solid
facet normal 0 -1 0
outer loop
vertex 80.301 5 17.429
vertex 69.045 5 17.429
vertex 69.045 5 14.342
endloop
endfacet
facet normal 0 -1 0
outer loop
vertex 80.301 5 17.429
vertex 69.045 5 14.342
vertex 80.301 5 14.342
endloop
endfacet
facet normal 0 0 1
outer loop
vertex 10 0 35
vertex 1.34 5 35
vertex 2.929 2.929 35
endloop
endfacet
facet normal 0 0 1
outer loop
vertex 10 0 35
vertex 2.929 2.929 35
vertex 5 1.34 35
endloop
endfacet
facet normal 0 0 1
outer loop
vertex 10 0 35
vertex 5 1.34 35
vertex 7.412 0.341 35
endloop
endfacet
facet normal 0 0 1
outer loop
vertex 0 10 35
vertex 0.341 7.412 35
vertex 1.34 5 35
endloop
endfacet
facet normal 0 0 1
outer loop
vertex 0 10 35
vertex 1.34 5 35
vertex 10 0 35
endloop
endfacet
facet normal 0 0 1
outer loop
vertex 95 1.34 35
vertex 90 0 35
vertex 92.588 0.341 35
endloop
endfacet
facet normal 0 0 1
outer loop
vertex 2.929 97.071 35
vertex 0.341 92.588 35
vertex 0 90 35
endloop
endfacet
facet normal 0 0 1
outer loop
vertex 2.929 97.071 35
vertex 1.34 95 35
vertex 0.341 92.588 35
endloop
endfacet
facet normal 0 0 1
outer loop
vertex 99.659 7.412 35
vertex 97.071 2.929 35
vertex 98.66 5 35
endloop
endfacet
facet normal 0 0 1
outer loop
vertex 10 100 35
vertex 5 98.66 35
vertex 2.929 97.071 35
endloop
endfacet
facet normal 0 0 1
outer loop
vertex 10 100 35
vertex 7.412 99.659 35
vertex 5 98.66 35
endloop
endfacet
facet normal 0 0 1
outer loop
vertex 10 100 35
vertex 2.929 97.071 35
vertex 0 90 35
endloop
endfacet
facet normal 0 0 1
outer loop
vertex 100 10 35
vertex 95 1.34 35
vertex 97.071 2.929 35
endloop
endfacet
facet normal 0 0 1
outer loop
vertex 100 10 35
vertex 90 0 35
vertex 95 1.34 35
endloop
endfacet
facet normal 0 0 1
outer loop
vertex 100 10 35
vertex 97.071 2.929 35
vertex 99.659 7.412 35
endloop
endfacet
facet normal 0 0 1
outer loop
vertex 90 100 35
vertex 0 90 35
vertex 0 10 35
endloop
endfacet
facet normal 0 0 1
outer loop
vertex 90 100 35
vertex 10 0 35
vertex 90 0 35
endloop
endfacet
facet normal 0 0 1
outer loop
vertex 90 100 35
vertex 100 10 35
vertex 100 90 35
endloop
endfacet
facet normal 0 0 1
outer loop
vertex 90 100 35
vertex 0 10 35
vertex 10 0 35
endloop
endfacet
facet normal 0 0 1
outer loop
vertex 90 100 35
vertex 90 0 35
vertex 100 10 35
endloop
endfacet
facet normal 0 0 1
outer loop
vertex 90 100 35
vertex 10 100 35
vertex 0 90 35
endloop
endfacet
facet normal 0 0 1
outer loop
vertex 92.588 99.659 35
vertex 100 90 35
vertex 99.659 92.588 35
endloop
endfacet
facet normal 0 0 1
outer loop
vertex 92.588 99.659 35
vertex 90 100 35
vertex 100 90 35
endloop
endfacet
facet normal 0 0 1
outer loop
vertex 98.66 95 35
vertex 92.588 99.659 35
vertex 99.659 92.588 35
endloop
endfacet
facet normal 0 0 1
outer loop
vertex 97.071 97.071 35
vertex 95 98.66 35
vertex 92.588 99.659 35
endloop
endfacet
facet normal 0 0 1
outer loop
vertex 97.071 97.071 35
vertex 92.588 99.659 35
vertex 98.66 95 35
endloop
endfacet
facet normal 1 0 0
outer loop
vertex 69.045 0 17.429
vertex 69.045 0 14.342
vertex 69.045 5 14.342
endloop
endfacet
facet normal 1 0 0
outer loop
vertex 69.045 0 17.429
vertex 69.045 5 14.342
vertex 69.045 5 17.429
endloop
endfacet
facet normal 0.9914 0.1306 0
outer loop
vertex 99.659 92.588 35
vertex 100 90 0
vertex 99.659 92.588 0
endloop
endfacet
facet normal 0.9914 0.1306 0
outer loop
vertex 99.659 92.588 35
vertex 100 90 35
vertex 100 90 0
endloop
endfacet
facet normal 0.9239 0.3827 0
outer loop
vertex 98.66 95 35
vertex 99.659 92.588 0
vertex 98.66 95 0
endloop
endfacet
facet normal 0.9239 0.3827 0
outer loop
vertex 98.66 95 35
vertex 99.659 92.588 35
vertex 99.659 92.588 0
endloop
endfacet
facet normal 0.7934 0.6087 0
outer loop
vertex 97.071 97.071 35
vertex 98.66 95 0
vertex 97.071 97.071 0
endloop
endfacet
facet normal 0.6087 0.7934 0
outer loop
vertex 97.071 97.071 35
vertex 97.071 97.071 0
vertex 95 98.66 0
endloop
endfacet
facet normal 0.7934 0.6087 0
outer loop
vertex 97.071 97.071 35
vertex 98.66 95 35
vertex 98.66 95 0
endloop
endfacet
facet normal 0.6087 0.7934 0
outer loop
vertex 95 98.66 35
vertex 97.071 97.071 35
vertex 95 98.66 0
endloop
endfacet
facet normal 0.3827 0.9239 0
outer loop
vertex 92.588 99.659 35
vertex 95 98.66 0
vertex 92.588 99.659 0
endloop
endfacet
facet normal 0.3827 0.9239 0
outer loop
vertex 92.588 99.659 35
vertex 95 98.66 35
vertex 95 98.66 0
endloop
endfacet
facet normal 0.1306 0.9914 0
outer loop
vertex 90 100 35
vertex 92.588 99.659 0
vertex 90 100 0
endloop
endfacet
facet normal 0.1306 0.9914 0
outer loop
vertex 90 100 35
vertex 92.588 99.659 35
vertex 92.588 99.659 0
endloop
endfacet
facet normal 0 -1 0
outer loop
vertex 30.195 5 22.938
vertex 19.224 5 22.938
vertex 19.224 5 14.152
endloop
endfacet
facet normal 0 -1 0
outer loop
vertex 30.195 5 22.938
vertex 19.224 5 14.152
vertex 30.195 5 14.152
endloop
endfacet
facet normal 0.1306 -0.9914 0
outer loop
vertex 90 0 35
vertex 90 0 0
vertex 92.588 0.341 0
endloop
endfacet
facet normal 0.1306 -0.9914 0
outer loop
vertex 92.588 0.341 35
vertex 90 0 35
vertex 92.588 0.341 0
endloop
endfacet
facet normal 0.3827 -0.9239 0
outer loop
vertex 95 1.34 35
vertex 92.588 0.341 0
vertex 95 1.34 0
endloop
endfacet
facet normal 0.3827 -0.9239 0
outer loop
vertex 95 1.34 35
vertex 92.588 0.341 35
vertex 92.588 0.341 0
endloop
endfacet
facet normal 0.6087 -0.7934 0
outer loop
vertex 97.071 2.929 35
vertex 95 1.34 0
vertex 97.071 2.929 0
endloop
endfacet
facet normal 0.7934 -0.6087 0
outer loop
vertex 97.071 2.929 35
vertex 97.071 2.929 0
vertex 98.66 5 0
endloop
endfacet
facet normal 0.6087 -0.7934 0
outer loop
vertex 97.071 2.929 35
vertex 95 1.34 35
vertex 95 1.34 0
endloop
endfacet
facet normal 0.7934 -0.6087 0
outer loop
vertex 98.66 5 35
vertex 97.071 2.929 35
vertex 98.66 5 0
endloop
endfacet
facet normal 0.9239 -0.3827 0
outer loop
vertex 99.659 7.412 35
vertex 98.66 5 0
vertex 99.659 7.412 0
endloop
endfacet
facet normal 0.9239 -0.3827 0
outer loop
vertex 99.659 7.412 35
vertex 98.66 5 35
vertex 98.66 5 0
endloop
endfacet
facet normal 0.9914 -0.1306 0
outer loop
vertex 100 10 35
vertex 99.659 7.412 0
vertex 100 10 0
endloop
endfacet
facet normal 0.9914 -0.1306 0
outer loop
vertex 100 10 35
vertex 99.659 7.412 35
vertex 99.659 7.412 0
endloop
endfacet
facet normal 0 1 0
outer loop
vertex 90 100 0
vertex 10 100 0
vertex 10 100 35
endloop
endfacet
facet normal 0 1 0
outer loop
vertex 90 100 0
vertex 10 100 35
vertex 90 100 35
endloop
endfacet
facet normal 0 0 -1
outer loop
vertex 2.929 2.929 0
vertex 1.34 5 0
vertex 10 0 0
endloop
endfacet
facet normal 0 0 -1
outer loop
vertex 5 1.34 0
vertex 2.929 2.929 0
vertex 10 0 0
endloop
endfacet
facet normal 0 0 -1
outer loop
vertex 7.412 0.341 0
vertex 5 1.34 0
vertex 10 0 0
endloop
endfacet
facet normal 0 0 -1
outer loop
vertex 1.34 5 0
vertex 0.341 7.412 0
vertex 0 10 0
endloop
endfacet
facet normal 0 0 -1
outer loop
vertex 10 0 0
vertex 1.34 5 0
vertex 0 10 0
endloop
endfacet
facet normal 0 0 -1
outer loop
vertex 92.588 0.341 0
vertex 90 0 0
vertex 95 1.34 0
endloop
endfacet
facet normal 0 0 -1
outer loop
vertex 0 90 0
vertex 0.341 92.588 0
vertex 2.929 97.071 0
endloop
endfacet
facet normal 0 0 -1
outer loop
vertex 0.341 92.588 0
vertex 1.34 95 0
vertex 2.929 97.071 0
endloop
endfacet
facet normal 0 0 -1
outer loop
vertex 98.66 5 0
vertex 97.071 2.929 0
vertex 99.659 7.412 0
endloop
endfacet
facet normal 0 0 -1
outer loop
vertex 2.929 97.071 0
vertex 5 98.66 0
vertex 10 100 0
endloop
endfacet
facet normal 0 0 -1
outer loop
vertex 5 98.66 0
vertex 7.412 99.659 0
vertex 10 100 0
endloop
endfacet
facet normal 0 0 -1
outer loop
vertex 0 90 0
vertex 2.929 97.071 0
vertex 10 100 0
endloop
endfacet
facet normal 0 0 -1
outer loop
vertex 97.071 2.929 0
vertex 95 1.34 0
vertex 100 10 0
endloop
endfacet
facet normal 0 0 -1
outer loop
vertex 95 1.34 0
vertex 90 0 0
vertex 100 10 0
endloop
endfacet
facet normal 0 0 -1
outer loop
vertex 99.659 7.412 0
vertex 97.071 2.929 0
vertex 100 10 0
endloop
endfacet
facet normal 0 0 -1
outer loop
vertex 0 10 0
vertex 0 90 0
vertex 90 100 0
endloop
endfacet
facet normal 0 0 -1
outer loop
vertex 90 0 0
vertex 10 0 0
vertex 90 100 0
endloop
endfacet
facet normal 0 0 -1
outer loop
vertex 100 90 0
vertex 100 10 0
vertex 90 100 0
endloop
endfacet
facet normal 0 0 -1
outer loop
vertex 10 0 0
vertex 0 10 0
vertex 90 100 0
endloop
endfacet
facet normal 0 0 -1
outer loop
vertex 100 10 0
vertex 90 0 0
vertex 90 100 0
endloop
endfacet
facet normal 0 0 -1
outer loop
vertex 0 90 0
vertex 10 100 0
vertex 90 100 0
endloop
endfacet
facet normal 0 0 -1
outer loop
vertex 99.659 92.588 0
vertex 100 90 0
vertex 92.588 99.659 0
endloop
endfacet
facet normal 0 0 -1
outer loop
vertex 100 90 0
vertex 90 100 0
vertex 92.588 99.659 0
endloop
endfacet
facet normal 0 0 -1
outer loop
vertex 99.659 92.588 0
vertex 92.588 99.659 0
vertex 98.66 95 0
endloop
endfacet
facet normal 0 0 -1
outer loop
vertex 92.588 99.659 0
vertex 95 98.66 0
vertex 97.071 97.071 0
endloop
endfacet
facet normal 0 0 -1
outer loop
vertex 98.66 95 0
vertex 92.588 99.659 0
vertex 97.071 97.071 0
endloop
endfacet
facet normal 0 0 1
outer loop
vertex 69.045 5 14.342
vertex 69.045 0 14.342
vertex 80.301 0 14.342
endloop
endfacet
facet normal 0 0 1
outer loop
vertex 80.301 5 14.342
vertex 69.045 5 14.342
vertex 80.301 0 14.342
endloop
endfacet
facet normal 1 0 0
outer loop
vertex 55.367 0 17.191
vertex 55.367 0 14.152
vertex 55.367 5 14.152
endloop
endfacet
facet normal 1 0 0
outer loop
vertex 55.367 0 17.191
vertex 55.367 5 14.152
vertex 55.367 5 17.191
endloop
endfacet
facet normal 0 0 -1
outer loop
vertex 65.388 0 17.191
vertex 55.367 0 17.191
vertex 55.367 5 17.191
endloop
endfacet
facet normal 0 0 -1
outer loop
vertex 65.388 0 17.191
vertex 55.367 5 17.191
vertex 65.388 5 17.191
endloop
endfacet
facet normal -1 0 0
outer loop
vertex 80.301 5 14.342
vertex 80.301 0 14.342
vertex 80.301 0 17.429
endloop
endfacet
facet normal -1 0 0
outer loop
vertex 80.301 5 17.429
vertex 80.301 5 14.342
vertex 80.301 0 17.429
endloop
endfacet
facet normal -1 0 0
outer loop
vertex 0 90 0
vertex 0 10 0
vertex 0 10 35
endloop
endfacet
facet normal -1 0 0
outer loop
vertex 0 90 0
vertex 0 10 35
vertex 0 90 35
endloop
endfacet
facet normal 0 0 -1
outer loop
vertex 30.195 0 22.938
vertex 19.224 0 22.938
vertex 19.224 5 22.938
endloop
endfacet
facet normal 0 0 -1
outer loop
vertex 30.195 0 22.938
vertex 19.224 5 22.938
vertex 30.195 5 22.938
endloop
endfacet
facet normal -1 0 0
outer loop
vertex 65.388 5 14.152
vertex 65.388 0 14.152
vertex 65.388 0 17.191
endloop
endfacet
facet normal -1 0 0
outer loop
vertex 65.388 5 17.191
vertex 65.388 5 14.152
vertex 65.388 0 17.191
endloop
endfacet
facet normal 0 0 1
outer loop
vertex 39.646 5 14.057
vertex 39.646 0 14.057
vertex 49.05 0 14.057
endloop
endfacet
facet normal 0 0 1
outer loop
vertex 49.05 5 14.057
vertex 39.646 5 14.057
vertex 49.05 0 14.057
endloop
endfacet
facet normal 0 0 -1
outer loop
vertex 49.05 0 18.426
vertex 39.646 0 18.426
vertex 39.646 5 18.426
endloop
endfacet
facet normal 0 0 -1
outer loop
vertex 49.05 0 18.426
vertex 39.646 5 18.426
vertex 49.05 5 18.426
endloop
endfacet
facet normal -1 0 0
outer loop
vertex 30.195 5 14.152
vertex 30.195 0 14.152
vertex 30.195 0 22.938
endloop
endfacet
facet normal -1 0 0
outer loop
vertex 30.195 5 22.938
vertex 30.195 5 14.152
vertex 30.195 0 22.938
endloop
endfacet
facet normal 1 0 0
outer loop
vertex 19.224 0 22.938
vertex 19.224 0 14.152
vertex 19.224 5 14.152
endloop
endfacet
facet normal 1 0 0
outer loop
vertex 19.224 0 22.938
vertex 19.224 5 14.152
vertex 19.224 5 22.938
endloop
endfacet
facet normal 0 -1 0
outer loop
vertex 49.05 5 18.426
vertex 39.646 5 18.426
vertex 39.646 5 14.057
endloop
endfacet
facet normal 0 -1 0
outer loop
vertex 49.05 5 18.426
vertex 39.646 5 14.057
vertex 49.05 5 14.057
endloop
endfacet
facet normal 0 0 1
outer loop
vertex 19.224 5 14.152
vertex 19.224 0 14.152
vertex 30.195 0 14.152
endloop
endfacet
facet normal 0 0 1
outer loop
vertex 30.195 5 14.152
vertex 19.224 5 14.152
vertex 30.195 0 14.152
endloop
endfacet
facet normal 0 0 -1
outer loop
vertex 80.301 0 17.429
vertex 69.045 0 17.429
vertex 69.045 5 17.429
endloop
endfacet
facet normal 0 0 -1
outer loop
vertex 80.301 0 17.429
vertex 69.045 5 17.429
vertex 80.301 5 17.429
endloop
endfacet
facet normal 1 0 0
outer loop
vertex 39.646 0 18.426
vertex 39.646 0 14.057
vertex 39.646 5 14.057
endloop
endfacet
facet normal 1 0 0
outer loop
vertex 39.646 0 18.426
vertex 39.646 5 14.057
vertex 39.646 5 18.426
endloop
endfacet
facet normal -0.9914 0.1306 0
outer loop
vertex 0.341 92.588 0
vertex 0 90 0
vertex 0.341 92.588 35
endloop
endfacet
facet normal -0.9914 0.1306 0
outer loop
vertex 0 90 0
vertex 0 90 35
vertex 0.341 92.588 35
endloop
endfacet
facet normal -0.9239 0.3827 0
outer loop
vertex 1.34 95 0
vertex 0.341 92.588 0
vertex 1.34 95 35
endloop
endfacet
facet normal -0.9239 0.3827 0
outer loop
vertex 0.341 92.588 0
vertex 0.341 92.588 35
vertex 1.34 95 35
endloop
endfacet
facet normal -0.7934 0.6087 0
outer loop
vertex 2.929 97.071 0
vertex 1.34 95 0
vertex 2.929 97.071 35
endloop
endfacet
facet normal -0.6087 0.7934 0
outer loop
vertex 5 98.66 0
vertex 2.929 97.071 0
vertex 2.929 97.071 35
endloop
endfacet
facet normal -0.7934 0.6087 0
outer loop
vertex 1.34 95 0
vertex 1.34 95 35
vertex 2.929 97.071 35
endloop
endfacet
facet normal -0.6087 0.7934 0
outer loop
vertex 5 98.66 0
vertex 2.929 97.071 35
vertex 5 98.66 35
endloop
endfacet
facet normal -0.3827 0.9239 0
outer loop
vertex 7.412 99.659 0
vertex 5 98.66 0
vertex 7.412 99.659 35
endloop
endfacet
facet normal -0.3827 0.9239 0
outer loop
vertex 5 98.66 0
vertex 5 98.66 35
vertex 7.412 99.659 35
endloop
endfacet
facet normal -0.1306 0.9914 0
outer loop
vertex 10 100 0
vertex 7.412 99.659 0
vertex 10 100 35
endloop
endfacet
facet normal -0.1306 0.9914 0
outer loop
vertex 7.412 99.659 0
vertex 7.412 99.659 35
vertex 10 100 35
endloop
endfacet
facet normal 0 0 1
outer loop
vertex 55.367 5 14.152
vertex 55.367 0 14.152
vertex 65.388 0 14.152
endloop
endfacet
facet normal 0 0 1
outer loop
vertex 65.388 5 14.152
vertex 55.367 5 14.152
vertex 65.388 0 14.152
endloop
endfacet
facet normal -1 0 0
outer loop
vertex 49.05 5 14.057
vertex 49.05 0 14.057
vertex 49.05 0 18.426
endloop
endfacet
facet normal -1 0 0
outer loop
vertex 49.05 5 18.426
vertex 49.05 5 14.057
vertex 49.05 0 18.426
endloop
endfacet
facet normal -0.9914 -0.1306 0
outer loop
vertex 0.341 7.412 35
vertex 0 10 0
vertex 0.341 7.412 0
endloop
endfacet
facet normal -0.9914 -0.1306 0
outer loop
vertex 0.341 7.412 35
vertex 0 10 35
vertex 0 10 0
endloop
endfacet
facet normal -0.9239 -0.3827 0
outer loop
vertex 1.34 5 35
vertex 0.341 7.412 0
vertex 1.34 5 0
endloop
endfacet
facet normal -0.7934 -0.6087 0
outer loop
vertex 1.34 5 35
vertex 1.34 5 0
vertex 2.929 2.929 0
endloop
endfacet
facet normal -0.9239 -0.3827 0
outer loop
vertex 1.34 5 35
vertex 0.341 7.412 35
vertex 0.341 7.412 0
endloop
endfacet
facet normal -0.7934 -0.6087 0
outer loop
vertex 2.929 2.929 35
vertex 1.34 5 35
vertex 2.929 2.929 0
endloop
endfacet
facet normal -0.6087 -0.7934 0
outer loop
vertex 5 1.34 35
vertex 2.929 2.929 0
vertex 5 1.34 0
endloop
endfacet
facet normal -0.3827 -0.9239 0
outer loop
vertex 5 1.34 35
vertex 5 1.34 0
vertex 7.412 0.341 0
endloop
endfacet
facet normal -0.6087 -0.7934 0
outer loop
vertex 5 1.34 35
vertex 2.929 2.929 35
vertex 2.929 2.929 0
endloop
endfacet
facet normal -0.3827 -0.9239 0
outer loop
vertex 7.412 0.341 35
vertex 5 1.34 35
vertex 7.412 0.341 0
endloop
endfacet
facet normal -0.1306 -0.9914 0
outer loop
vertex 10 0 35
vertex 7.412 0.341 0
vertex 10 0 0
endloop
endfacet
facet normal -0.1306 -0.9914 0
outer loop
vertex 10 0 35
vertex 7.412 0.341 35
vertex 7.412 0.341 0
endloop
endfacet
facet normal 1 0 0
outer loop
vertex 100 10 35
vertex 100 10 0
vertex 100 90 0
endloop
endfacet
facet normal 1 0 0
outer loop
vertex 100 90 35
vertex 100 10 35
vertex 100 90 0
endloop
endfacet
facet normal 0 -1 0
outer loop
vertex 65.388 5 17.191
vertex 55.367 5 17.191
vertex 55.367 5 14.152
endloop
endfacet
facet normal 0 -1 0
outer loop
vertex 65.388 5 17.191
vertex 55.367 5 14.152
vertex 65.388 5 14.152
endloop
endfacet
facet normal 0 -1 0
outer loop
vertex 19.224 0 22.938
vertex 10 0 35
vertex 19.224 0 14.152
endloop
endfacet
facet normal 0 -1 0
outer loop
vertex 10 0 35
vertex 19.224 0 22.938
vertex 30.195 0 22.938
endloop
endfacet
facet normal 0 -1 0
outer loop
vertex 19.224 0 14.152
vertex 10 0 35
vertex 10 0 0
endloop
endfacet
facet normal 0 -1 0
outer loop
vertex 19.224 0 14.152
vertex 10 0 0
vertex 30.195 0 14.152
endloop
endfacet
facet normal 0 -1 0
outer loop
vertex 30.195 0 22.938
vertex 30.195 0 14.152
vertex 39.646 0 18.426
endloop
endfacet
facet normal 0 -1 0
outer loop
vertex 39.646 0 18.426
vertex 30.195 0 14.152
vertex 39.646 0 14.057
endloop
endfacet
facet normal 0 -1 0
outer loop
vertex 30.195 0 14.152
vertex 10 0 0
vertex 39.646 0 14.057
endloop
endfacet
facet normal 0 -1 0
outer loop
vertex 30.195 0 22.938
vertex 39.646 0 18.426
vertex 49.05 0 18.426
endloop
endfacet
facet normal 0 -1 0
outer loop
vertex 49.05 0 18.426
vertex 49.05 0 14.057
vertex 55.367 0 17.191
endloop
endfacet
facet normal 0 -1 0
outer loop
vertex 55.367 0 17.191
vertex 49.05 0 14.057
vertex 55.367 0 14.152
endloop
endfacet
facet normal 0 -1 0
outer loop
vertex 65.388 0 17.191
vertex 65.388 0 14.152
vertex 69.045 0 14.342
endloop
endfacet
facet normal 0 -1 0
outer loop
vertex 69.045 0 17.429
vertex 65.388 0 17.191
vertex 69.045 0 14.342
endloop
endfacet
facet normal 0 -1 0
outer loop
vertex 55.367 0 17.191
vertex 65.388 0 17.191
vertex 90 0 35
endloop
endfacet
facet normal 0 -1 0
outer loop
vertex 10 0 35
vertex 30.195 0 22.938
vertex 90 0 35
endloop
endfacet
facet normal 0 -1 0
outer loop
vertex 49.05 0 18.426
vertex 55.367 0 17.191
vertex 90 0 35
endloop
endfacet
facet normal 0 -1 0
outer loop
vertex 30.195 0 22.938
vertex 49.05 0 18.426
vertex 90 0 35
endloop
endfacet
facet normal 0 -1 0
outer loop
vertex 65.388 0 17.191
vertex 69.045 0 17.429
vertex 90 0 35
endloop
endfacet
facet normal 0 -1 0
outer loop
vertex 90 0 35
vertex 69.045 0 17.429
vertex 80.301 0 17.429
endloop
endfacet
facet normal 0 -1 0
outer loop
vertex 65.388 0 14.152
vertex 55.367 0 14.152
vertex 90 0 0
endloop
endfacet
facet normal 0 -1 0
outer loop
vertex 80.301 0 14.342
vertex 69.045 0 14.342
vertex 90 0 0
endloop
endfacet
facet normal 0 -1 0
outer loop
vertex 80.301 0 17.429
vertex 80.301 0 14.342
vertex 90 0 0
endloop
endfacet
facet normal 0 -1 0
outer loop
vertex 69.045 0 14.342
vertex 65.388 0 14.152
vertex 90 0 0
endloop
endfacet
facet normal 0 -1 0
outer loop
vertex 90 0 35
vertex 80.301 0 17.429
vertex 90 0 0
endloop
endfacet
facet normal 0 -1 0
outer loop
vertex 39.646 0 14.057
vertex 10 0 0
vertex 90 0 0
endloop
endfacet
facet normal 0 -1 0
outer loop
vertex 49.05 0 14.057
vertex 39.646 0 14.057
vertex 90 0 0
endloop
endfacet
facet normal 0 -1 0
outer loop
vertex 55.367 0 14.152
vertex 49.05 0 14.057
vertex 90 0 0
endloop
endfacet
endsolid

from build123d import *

# Parameters (mm, degrees)
SKETCH1_W           = 100
SKETCH1_H           = 100
BOSS_EXTRUDE1_DEPTH = 35
FILLET1_R           = 10
SKETCH2_W           = 9.403715906
SKETCH2_H           = 4.36940335
SKETCH2_W_2         = 10.971001891
SKETCH2_H_2         = 8.786300215
SKETCH2_W_3         = 11.255962979
SKETCH2_H_3         = 3.087078454
SKETCH2_W_4         = 10.021131597
SKETCH2_H_4         = 3.03958494
CUT_EXTRUDE1_DEPTH  = 5


with BuildPart() as part:
    # Sketch1 → Boss-Extrude1 (new body)
    with BuildSketch(Plane.XY):
        with Locations((50, 50)):
            Rectangle(SKETCH1_W, SKETCH1_H)
    extrude(amount=BOSS_EXTRUDE1_DEPTH)

    # Fillet1
    fillet1_edges = [part.edges().sort_by_distance(p)[0] for p in [
        (0, 100, 17.5),
        (100, 100, 17.5),
        (100, 0, 17.5),
        (0, 0, 17.5),
    ]]
    fillet(fillet1_edges, radius=FILLET1_R)

    # Sketch2 → Cut-Extrude1 (cut)
    with BuildSketch(Plane.XZ):
        with Locations((44.348271753, 16.241421861)):
            Rectangle(SKETCH2_W, SKETCH2_H)
        with Locations((24.709703434, 18.544857323)):
            Rectangle(SKETCH2_W_2, SKETCH2_H_2)
        with Locations((74.672880875, 15.885220501)):
            Rectangle(SKETCH2_W_3, SKETCH2_H_3)
        with Locations((60.377332957, 15.671499685)):
            Rectangle(SKETCH2_W_4, SKETCH2_H_4)
    extrude(amount=-CUT_EXTRUDE1_DEPTH, mode=Mode.SUBTRACT)


solid = part.part
